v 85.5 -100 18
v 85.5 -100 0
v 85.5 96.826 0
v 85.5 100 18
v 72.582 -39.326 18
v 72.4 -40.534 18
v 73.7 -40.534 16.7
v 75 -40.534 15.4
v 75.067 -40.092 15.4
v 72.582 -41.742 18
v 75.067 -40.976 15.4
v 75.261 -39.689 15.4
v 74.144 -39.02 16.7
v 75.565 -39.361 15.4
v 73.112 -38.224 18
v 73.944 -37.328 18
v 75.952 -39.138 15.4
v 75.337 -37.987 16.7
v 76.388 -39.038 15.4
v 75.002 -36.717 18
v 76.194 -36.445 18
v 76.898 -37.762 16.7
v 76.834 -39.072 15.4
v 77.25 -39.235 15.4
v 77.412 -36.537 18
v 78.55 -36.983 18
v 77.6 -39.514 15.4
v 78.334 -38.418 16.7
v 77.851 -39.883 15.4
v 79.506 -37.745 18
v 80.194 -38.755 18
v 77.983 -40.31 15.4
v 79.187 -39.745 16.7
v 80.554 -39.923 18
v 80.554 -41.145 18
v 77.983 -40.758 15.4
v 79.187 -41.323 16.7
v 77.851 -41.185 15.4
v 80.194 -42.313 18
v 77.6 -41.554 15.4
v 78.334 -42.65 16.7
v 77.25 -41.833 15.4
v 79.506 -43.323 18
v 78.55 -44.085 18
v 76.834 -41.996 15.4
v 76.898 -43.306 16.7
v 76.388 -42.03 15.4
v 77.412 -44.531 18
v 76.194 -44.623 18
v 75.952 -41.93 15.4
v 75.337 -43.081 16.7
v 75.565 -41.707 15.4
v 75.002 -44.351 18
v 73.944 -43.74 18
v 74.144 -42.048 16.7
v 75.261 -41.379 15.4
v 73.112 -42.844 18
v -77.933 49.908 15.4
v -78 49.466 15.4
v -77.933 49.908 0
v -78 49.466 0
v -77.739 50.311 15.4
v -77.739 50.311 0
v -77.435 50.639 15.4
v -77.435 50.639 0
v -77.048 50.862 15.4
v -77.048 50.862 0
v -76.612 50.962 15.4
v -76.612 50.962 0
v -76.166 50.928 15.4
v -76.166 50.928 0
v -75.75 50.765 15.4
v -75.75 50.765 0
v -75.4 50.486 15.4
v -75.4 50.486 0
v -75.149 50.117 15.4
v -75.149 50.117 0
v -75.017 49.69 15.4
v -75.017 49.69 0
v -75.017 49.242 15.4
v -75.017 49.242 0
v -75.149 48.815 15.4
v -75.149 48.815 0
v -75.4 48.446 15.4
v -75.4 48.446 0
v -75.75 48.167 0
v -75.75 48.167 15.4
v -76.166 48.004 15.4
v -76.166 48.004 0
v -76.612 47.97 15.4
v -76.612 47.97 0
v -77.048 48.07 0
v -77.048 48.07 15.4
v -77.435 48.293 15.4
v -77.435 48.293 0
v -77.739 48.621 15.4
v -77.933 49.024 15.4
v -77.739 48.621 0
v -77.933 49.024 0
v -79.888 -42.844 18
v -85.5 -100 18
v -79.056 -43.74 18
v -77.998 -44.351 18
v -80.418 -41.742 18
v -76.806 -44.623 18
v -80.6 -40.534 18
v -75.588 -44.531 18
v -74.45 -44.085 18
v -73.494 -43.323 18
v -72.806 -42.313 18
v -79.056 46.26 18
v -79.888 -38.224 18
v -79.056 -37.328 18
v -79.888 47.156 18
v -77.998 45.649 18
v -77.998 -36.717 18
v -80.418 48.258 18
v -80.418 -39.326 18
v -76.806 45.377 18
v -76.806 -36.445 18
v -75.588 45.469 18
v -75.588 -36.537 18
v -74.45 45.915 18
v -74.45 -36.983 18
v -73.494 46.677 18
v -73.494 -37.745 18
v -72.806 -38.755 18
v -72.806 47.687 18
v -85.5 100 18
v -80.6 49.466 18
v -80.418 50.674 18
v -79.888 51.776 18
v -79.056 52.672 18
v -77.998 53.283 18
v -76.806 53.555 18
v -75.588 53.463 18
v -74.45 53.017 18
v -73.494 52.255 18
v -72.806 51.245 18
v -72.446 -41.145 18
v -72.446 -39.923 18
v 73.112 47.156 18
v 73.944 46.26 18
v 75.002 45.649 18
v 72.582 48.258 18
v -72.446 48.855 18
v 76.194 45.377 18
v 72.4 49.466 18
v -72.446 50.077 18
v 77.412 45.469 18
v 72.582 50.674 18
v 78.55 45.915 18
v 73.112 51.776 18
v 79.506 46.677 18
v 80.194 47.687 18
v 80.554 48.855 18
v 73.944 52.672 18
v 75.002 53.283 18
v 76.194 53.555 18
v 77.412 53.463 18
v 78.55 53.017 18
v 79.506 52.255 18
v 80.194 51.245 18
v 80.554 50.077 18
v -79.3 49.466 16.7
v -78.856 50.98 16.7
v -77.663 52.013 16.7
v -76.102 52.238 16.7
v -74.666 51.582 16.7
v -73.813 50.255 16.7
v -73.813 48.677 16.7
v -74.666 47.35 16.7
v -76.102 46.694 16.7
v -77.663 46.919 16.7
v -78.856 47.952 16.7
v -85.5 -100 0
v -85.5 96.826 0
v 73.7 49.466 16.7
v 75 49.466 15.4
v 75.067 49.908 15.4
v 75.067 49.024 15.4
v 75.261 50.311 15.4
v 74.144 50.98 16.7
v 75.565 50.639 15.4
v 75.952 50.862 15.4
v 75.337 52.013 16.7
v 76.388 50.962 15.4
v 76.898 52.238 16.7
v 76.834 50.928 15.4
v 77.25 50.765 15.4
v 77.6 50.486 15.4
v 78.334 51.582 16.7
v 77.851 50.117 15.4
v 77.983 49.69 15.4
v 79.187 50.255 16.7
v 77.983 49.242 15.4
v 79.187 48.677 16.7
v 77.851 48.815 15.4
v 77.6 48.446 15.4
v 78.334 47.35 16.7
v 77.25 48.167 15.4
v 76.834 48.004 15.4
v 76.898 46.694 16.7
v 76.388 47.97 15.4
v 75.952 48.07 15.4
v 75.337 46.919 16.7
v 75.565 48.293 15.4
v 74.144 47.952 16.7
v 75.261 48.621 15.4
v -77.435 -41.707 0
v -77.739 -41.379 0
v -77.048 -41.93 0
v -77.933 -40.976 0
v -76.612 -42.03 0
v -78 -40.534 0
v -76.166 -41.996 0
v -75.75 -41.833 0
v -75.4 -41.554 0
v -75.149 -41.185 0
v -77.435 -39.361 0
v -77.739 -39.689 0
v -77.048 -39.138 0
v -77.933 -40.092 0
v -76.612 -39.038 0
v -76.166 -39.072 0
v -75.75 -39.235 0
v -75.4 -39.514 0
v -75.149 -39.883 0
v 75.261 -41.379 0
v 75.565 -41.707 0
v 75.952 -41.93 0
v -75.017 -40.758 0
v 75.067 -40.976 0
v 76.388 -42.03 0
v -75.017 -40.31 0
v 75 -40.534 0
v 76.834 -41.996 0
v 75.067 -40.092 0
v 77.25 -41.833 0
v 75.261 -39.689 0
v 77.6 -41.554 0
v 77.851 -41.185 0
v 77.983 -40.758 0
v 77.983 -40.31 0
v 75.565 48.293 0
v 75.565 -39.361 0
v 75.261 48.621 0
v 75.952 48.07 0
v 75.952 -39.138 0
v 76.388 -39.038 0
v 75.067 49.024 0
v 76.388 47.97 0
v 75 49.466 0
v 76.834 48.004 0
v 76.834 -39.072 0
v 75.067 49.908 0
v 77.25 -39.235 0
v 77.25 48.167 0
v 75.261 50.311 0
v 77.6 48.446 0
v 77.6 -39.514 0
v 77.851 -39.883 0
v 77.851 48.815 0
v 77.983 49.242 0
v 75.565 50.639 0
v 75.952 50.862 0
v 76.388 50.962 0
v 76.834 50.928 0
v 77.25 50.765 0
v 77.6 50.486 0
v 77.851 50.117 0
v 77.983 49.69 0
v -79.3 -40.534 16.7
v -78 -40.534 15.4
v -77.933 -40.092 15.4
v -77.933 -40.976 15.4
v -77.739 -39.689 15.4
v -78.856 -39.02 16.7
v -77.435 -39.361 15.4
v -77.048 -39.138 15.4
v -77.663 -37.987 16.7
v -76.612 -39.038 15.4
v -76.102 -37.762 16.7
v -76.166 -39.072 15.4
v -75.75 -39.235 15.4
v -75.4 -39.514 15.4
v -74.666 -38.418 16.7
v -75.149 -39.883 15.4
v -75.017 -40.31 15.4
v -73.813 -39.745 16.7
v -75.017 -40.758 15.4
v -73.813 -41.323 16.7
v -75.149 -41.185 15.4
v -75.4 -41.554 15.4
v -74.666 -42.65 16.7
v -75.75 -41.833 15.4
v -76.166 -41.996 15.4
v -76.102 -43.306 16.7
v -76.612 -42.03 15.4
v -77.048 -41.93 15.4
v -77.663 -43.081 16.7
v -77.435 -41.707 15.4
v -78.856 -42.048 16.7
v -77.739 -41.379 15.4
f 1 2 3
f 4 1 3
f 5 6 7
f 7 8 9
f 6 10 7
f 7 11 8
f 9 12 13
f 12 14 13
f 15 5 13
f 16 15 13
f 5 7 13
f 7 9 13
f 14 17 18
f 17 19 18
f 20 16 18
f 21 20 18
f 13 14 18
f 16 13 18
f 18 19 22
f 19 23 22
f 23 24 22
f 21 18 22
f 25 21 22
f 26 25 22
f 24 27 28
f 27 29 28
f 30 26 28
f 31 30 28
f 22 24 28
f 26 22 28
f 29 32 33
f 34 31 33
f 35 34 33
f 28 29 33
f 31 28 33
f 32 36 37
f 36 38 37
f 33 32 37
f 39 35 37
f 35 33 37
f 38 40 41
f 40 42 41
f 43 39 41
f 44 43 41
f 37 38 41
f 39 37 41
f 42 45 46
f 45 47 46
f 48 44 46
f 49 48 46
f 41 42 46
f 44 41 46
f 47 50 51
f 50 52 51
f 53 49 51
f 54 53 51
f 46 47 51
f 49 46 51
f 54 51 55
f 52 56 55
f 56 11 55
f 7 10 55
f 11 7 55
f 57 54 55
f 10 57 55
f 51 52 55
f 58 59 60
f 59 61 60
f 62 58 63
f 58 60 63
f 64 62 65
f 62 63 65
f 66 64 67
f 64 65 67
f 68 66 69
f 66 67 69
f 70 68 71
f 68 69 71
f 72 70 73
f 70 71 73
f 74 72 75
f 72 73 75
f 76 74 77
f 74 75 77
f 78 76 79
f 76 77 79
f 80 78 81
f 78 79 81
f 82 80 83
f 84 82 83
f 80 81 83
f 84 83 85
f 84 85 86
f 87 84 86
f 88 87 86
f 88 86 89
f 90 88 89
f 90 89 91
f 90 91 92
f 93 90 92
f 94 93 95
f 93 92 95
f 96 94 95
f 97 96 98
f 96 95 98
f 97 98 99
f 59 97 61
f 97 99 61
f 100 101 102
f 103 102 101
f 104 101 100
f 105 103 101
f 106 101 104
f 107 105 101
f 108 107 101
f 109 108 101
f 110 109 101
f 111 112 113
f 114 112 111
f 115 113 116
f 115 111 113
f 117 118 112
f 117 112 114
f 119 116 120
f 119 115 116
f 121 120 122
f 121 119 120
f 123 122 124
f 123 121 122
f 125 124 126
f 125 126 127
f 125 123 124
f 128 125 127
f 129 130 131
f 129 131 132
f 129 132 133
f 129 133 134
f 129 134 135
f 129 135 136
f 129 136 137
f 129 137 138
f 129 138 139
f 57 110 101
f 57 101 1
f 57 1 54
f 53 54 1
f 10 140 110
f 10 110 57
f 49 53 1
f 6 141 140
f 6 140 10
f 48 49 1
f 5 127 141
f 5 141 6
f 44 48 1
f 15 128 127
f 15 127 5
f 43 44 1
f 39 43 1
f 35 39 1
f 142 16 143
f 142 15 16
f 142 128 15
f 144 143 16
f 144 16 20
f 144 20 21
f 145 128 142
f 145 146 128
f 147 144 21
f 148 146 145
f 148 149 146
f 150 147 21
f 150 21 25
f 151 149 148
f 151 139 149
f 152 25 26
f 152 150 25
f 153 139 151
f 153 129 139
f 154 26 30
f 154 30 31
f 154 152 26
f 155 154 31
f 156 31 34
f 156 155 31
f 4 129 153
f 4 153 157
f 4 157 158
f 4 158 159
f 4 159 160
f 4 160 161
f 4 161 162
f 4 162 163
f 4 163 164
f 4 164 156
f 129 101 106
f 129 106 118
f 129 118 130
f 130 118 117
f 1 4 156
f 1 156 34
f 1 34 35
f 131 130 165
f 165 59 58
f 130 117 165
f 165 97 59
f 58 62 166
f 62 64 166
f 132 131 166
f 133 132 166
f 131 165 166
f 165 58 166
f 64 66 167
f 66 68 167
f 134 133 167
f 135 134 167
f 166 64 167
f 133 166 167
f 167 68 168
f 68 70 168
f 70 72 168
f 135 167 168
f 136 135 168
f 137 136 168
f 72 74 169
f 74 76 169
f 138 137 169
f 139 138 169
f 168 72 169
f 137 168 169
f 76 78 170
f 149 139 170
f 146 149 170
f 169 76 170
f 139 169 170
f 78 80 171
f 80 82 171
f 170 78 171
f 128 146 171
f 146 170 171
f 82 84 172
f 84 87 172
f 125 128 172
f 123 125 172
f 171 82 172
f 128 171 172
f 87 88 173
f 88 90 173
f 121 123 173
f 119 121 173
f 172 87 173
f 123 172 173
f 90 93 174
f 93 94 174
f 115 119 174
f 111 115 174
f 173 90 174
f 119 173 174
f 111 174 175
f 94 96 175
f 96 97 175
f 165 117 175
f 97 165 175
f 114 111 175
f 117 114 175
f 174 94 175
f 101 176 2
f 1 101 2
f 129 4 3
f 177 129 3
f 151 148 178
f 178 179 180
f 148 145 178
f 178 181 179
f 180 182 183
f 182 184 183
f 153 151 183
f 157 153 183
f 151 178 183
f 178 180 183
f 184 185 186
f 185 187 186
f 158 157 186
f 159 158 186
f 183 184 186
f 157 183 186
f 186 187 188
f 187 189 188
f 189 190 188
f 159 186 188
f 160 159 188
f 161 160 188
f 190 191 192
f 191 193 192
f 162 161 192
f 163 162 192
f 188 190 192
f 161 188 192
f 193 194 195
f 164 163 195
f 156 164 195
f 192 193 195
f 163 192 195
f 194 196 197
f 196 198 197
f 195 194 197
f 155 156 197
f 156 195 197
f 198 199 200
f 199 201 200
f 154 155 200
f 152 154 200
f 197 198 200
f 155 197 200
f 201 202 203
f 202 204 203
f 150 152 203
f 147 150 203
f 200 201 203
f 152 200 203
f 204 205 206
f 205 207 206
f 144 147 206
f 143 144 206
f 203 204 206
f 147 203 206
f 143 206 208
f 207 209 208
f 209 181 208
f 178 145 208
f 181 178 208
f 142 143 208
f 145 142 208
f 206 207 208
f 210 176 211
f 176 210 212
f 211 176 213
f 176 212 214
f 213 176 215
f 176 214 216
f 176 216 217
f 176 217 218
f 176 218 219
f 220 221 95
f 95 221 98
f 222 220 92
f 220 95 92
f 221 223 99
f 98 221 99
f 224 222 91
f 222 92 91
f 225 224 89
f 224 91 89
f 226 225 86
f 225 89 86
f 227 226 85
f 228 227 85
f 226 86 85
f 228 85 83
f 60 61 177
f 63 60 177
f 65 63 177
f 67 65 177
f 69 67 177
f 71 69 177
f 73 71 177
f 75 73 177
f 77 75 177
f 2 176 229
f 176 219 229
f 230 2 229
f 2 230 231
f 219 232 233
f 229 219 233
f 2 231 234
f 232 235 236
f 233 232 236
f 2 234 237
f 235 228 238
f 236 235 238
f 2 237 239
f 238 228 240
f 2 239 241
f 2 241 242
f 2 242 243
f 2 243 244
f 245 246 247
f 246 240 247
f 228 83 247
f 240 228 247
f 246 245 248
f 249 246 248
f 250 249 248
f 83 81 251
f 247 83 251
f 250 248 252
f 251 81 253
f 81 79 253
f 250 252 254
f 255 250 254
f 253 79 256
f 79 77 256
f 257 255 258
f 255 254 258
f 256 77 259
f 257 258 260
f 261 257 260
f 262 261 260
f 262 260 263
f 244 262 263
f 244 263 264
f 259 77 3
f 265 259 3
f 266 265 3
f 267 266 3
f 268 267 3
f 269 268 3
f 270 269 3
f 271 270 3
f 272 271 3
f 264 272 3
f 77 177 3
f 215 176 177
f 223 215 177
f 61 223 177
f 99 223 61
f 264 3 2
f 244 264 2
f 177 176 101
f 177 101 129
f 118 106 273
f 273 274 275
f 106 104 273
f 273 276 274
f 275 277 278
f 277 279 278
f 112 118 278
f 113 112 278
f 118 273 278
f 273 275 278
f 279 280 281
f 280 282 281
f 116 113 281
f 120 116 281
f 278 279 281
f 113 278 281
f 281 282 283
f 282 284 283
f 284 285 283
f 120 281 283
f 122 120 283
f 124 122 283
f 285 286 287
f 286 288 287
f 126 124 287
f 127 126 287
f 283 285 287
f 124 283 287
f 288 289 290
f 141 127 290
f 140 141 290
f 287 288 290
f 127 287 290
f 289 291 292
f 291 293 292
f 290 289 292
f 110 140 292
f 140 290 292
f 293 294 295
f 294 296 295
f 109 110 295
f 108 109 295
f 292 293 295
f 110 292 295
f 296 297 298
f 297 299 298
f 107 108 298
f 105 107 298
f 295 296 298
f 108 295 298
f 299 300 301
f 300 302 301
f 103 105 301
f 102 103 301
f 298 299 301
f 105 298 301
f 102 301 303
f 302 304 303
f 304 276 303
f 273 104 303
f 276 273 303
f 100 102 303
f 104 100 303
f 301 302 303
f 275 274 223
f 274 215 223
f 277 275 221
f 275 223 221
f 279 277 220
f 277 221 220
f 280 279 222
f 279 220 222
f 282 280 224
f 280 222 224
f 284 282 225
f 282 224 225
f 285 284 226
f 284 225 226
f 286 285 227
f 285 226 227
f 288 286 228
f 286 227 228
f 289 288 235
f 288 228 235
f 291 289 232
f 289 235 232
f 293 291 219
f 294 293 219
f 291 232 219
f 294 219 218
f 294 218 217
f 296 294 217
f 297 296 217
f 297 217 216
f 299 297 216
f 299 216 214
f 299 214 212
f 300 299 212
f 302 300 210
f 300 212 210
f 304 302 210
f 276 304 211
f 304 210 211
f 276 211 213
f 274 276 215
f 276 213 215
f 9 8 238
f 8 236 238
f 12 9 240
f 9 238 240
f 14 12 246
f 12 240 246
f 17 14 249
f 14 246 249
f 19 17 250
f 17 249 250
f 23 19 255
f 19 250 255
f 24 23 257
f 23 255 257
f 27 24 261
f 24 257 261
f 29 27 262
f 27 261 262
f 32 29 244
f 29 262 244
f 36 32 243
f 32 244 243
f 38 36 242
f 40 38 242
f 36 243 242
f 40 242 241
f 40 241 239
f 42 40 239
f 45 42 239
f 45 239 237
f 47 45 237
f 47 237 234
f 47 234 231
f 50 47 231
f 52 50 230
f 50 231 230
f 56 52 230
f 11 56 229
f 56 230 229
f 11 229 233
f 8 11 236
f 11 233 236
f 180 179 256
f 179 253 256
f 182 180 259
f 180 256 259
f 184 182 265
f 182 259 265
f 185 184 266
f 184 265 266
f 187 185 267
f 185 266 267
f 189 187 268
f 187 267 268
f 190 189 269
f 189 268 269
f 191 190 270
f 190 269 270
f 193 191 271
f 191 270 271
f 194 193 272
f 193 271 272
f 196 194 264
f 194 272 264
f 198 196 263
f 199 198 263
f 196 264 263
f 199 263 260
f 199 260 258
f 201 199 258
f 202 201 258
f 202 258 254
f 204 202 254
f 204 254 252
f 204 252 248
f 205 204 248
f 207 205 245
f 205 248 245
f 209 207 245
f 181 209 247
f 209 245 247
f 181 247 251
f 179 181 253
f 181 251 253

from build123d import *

# Parameters (mm, degrees)
F0_W           = 171
F0_H           = 200
F1_DEPTH       = 18
F3_DEPTH       = 171.001
F5_D           = 3
F5_CSINK_D     = 8.2
F5_CSINK_ANGLE = 90
F6_D           = 3
F6_CSINK_D     = 8.2
F6_CSINK_ANGLE = 90


with BuildPart() as f1:
    # F0 (on Top) → F1 (new body)
    with BuildSketch(Plane.XY):
        Rectangle(F0_W, F0_H)
    extrude(amount=F1_DEPTH)

    # F2 (on face) → F3 (cut, through all)
    with BuildSketch(Plane.YZ.offset(85.5)):
        Polygon((100, 0), (100, 18), (96.826114, 0), align=None)
    extrude(amount=-F3_DEPTH, mode=Mode.SUBTRACT)

    # F5 (through all)
    with Locations(Plane.XY.offset(18)):
        with Locations((-76.5, 49.466), (76.5, 49.466)):
            CounterSinkHole(F5_D / 2, F5_CSINK_D / 2, counter_sink_angle=F5_CSINK_ANGLE)

    # F6 (through all)
    with Locations(Plane.XY.offset(18)):
        with Locations((-76.5, -40.534), (76.5, -40.534)):
            CounterSinkHole(F6_D / 2, F6_CSINK_D / 2, counter_sink_angle=F6_CSINK_ANGLE)


solid = f1.part
